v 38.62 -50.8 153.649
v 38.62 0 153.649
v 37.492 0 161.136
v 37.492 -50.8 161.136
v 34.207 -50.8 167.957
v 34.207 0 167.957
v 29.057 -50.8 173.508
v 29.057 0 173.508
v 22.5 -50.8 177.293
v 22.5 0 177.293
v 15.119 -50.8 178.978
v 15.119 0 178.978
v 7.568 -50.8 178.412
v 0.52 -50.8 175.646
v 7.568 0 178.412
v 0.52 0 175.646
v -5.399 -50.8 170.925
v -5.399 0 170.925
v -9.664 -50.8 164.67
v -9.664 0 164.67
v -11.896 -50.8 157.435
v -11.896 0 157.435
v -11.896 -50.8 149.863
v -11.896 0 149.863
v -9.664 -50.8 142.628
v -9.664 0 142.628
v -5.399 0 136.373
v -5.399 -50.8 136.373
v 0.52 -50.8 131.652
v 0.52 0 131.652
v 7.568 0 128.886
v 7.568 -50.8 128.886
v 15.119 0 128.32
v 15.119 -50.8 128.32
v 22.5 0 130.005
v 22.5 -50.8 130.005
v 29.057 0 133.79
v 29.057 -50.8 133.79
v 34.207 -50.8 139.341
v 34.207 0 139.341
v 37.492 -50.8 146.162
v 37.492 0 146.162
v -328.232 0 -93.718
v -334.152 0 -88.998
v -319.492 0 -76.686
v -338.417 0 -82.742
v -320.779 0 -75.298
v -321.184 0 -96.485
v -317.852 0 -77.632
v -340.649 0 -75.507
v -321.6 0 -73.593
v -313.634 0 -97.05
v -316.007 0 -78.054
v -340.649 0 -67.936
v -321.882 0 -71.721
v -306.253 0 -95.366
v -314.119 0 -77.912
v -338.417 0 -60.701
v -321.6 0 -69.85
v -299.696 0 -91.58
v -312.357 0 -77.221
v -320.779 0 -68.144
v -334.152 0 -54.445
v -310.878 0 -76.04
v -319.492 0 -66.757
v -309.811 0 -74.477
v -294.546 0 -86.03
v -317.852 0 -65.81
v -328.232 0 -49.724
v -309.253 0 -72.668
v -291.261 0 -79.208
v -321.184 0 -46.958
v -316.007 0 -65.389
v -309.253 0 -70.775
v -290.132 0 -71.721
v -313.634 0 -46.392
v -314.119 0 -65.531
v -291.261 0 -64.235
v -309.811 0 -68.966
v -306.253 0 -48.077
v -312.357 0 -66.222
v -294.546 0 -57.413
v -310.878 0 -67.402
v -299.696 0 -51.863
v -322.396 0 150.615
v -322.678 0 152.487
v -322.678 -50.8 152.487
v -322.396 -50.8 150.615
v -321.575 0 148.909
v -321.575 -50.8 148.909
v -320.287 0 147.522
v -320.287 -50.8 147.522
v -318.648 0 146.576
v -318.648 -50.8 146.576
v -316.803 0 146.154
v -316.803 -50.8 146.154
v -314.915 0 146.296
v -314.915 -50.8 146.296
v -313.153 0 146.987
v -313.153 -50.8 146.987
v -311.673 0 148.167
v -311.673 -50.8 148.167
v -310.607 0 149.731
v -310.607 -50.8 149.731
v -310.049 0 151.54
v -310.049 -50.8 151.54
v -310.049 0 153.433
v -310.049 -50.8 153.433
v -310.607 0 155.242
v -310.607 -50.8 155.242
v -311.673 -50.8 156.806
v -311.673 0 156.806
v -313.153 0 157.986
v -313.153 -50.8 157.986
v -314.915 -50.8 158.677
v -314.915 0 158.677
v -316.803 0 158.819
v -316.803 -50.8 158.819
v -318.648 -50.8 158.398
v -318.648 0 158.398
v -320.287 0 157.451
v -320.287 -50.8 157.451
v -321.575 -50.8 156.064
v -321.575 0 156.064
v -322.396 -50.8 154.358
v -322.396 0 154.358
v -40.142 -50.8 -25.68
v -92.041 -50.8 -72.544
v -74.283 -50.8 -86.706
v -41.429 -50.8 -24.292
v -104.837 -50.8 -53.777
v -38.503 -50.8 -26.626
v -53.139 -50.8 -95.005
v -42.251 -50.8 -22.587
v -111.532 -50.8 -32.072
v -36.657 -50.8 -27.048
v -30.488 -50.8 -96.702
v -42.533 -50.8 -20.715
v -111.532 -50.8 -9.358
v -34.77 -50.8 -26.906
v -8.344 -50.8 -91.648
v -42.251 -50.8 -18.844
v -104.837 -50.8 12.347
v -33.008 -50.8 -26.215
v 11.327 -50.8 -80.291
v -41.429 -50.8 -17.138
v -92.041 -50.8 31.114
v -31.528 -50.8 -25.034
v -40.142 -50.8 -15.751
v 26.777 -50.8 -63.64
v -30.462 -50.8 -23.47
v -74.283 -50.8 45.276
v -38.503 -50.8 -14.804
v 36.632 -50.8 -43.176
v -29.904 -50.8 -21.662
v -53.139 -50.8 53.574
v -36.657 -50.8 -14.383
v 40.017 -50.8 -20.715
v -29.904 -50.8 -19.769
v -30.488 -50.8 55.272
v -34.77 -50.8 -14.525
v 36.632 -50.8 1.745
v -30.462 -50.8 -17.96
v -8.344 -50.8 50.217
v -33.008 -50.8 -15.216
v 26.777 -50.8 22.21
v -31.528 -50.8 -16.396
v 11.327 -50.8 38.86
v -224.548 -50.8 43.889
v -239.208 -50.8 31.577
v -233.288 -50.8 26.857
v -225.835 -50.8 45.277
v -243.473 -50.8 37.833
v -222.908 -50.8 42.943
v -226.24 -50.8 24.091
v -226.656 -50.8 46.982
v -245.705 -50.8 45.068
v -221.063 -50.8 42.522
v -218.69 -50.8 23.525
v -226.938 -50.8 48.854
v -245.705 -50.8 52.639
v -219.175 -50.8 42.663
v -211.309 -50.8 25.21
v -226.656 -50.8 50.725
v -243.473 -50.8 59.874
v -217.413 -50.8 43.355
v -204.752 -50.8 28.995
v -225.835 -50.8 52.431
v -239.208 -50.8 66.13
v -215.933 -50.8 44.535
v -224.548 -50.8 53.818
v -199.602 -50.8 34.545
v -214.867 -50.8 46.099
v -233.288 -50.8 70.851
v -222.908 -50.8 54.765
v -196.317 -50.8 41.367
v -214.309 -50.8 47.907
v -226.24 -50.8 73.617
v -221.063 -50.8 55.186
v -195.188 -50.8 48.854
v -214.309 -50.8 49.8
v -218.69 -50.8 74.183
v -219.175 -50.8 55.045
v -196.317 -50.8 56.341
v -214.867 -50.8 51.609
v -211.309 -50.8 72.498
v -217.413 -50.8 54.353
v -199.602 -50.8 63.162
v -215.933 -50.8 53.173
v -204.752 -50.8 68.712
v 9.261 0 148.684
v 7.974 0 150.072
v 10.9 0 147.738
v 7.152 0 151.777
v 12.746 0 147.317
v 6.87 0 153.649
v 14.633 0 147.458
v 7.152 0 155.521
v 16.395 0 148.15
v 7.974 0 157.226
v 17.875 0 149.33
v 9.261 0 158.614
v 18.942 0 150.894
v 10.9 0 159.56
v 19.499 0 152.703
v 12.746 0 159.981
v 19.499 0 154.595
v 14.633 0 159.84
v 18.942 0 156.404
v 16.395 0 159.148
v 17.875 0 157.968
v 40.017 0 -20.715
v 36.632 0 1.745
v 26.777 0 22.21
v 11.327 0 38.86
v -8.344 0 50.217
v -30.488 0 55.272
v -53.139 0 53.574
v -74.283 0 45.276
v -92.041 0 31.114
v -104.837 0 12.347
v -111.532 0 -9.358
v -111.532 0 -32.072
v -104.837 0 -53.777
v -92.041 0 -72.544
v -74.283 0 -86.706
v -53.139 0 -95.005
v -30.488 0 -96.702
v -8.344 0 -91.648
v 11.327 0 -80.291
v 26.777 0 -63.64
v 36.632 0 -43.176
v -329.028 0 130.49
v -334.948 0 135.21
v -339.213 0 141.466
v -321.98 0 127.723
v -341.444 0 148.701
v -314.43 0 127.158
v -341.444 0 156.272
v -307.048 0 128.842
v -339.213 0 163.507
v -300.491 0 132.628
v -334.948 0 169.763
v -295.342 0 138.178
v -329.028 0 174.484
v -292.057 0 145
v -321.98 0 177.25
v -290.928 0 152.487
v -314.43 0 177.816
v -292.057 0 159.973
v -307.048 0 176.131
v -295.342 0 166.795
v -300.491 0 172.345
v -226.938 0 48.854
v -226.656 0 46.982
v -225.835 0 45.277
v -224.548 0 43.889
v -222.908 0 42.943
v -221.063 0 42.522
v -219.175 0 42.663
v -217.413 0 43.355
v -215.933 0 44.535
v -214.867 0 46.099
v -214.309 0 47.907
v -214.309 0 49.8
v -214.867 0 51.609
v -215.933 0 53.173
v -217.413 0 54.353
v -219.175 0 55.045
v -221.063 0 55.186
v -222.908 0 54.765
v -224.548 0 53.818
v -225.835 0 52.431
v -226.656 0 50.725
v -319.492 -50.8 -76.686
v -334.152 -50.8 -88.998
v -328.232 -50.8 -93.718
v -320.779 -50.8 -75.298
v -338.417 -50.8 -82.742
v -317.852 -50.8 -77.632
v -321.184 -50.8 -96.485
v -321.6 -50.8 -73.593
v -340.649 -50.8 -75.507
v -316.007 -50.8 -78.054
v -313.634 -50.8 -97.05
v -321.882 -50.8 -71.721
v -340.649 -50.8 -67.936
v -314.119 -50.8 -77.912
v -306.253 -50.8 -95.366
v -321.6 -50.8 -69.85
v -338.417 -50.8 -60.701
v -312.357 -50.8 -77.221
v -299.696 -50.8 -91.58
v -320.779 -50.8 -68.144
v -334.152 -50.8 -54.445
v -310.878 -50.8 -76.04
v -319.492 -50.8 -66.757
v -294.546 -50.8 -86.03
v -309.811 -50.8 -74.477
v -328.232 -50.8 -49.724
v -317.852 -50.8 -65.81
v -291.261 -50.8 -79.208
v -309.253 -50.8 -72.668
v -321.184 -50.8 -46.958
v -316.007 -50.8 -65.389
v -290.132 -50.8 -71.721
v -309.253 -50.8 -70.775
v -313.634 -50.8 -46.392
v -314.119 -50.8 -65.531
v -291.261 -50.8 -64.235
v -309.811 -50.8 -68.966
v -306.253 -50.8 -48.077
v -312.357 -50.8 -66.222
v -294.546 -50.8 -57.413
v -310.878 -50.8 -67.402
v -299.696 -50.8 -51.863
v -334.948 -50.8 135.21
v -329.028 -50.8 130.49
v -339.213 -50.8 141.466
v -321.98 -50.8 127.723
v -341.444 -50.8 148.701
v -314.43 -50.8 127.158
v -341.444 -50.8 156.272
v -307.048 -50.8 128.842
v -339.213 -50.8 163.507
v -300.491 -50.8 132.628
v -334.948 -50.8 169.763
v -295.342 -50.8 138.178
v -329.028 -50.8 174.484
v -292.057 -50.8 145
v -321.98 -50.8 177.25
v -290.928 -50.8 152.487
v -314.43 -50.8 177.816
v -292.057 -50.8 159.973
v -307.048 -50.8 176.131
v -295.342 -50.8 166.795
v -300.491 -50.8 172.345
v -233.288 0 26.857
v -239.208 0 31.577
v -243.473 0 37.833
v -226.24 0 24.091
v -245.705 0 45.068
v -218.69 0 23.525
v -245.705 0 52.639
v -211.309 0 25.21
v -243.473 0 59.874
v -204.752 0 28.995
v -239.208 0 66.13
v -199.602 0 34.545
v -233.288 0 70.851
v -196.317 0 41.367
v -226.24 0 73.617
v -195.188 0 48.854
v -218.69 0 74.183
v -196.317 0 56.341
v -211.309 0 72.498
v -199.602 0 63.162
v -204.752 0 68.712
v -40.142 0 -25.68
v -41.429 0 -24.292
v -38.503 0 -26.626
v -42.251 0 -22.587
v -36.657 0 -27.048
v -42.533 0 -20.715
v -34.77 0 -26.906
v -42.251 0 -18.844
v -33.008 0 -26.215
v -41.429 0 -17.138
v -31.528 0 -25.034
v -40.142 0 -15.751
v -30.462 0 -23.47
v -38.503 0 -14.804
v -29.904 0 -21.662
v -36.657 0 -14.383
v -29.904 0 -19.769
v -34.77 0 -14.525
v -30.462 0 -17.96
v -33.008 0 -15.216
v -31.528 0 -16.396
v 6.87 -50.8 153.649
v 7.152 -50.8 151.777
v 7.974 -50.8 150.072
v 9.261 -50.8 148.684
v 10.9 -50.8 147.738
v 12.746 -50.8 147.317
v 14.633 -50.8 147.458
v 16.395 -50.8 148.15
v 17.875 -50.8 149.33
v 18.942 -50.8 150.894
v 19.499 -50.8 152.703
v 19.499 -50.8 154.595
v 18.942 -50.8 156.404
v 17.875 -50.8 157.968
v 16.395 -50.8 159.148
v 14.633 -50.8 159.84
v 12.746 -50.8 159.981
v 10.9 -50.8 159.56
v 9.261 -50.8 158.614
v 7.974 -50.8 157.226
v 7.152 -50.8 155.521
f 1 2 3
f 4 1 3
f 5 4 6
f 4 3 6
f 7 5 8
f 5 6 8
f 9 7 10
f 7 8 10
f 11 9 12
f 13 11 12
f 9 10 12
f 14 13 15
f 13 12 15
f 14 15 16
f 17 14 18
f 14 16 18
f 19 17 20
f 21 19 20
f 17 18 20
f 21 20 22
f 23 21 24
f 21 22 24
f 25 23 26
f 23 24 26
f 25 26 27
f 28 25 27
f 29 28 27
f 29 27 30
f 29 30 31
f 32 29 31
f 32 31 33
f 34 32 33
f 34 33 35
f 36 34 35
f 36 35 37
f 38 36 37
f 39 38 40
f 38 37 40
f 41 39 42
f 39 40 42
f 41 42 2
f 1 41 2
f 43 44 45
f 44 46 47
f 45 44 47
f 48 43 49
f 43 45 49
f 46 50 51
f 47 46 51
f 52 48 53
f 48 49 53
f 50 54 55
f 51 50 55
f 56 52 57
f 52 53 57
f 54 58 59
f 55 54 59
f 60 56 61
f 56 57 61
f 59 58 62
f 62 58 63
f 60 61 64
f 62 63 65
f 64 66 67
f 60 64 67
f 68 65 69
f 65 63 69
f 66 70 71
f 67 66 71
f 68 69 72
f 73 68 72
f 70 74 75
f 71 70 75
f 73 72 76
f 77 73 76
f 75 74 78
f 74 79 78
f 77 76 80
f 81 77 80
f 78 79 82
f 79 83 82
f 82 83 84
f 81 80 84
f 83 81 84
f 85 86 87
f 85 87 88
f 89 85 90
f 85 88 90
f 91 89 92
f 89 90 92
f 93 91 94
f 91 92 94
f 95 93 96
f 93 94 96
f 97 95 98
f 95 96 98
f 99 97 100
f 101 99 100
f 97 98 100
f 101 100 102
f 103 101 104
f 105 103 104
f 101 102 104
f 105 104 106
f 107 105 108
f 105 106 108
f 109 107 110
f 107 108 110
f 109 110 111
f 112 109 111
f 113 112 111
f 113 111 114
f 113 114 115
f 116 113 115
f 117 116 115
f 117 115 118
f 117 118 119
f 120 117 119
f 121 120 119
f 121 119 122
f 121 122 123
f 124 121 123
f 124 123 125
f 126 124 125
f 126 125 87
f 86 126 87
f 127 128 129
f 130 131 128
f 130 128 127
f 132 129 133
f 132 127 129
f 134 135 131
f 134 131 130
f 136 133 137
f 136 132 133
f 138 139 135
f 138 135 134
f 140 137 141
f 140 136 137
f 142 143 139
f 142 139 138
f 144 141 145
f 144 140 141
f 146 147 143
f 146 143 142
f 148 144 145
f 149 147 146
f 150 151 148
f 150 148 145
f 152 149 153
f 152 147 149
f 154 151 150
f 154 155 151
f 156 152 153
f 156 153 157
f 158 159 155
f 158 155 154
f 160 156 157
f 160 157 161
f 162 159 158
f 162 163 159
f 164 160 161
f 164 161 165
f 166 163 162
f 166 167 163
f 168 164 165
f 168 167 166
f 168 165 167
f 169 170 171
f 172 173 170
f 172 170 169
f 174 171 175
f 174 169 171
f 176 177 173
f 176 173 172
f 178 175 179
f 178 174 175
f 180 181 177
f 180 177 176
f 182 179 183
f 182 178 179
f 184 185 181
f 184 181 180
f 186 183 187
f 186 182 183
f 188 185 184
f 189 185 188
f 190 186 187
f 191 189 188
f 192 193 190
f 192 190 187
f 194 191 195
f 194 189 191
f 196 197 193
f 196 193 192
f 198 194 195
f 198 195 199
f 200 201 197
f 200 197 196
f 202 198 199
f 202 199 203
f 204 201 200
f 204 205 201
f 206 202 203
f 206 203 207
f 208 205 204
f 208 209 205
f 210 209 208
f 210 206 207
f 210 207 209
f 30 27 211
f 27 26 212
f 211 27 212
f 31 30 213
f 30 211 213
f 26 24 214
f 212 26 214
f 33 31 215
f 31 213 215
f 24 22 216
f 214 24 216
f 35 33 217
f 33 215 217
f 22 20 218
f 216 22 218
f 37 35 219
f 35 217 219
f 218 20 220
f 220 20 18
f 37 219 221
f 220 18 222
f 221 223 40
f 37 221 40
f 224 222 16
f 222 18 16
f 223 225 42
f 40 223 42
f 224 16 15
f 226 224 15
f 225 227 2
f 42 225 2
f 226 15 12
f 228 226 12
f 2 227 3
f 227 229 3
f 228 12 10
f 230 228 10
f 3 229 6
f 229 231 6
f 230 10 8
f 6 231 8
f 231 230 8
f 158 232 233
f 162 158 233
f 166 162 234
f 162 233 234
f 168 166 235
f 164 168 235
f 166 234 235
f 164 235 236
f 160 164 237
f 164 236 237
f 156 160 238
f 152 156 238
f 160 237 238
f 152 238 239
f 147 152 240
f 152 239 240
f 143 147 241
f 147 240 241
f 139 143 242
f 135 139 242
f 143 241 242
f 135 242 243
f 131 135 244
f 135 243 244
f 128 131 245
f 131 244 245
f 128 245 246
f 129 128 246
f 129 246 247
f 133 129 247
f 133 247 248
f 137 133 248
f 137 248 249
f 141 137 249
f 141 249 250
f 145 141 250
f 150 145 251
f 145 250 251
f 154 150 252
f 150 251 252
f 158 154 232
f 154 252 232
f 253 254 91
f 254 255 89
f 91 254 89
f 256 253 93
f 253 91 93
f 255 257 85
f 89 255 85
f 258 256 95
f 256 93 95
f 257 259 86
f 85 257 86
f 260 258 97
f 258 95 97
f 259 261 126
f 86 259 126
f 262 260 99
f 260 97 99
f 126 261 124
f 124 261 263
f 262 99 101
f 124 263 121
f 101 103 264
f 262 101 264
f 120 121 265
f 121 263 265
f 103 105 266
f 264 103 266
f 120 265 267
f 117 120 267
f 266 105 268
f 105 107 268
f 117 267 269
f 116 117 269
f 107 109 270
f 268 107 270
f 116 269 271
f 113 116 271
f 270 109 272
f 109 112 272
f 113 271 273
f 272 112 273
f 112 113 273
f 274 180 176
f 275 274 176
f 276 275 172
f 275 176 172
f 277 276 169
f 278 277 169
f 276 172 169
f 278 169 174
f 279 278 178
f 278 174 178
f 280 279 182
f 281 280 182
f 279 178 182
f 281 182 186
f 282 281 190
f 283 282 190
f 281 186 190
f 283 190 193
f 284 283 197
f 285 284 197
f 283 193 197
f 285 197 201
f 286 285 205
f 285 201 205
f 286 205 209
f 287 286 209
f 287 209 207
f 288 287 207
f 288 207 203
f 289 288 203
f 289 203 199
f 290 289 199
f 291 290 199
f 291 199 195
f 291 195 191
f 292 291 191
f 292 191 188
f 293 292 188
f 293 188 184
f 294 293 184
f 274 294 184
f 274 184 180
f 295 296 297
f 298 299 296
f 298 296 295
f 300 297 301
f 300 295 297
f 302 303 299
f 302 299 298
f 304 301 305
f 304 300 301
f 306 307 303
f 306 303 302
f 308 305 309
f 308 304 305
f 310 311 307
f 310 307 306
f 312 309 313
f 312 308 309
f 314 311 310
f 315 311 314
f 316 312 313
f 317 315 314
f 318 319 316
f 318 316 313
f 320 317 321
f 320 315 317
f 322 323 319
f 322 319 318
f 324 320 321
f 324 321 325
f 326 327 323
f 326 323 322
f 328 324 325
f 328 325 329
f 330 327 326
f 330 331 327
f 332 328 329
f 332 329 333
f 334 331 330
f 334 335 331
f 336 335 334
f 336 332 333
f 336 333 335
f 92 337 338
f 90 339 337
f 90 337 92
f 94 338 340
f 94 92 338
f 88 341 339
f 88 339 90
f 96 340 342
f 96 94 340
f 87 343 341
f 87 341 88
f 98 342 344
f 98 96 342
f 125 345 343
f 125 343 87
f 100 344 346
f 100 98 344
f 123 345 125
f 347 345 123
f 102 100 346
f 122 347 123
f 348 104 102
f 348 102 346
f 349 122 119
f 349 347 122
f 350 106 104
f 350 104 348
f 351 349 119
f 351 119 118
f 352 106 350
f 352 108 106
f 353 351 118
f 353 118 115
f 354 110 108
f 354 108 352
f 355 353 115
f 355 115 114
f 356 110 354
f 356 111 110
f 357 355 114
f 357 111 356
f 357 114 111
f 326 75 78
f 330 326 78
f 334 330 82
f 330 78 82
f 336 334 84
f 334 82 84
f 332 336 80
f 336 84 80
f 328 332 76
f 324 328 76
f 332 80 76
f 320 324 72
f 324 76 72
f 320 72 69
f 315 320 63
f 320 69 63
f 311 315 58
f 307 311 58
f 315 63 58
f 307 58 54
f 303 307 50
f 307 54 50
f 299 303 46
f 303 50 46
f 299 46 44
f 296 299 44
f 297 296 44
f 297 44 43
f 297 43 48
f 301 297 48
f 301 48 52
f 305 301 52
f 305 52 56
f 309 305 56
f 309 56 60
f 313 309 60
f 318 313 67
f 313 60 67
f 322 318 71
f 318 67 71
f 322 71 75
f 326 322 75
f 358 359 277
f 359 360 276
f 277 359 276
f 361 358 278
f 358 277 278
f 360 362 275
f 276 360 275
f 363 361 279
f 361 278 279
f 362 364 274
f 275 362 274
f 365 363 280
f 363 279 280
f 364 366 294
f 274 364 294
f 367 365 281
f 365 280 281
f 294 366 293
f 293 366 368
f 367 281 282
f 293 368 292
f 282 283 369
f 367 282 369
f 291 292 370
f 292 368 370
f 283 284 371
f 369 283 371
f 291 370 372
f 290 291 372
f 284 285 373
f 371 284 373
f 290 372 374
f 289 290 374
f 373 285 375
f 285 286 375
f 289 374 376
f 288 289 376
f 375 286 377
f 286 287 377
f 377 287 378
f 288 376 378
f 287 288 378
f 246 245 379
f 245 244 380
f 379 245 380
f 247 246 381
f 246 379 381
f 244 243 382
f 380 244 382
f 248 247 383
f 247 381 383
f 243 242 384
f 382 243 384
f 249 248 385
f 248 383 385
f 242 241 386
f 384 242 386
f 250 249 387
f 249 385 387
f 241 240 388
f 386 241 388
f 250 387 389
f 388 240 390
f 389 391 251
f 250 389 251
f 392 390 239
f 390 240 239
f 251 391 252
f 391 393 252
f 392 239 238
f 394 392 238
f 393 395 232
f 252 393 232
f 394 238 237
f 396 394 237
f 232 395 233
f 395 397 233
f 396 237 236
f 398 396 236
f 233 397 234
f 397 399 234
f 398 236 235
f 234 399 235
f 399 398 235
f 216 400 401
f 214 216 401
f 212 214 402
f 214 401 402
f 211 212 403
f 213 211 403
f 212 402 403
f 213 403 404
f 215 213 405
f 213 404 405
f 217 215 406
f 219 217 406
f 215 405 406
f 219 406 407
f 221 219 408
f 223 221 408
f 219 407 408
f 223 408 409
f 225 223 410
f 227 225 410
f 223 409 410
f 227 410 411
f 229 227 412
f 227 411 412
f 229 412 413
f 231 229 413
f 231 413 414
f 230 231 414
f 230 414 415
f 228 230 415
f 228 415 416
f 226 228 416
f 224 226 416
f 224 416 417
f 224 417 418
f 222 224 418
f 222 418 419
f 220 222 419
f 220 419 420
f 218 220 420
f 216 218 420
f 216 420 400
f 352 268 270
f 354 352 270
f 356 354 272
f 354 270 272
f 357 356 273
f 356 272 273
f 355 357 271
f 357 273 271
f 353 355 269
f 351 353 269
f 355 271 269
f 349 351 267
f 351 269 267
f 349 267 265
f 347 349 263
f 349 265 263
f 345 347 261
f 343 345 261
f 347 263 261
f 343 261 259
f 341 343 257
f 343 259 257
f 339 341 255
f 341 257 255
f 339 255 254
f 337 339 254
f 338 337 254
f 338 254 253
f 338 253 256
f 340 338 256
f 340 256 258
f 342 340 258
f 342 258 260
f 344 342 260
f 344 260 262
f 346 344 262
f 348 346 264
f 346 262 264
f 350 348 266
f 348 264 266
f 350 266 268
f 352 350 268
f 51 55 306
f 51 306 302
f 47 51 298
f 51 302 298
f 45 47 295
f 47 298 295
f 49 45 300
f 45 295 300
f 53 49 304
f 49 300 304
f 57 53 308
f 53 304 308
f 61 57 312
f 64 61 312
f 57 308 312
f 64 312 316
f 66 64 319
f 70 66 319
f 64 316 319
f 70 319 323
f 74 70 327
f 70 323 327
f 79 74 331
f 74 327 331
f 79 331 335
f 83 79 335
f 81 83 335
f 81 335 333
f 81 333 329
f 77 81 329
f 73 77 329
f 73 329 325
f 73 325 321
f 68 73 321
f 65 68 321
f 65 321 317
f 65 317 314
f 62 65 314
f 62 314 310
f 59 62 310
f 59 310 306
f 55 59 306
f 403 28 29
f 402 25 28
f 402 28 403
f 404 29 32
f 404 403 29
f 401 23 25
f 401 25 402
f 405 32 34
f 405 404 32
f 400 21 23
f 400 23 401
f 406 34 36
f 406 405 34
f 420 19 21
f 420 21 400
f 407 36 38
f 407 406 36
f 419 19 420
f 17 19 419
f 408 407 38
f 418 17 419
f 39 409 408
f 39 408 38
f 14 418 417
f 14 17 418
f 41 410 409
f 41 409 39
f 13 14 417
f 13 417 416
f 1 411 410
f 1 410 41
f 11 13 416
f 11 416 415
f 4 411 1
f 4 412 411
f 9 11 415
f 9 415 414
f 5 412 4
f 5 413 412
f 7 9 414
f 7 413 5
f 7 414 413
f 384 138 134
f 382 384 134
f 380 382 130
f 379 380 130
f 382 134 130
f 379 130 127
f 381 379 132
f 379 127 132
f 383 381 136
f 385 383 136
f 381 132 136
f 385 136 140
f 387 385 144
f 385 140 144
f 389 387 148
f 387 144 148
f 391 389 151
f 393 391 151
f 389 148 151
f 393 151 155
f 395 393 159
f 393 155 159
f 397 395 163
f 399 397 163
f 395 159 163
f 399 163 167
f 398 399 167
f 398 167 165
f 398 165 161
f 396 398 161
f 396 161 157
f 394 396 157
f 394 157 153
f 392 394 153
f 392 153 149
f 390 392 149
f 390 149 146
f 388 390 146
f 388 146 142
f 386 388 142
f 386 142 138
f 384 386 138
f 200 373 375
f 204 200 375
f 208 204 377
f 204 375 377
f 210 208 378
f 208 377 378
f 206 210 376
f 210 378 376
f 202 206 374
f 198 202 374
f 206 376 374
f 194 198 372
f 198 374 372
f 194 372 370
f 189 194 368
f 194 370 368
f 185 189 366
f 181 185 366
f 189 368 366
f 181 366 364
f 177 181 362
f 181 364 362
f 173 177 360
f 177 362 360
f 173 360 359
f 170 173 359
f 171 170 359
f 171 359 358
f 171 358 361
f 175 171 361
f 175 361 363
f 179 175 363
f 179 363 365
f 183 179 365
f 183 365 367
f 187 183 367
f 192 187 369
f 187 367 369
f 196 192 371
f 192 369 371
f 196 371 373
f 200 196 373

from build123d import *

# Parameters (mm, degrees)
F0_R       = 25.4
F2_DEPTH   = 50.8
F1_R       = 76.2
F5_DEPTH   = 50.8
F6_D       = 12.7
F6_2_D     = 12.7
F6_3_D     = 12.7
F6_ON_F1_D = 12.7
F7_D       = 12.7


# Not quite as in the source:
# - the program builds the solid bodies; features that only make, move or delete a surface that nothing else refers to are left out


with BuildPart() as f2:
    # F0 (on Front) → F2 (new body)
    with BuildSketch(Plane.XZ):
        with Locations((-316.3281083107, 152.4865627289)):
            Circle(F0_R)
    extrude(amount=F2_DEPTH)

    # F6 (through all)
    with Locations(Plane(origin=(0, 0, 0), x_dir=(1, 0, 0), z_dir=(0, 1, 0))):
        with Locations((-315.5324161053, 71.7213749886), (-316.3281083107, -152.4865627289), (13.2203800604, -153.6489874125), (-220.5883562565, -48.8537736237)):
            Hole(F6_D / 2)


with BuildPart() as f2b:
    # F0 (on Front) → F2, piece 2 (new body)
    with BuildSketch(Plane.XZ):
        with Locations((-315.5324161053, -71.7213749886)):
            Circle(F0_R)
    extrude(amount=F2_DEPTH)

    # F6#2 (through all)
    with Locations(Plane(origin=(0, 0, 0), x_dir=(1, 0, 0), z_dir=(0, 1, 0))):
        with Locations((-315.5324161053, 71.7213749886), (-316.3281083107, -152.4865627289), (13.2203800604, -153.6489874125), (-220.5883562565, -48.8537736237)):
            Hole(F6_2_D / 2)


with BuildPart() as f2c:
    # F0 (on Front) → F2, piece 3 (new body)
    with BuildSketch(Plane.XZ):
        with Locations((13.2203800604, 153.6489874125)):
            Circle(F0_R)
    extrude(amount=F2_DEPTH)

    # F6#3 (through all)
    with Locations(Plane(origin=(0, 0, 0), x_dir=(1, 0, 0), z_dir=(0, 1, 0))):
        with Locations((-315.5324161053, 71.7213749886), (-316.3281083107, -152.4865627289), (13.2203800604, -153.6489874125), (-220.5883562565, -48.8537736237)):
            Hole(F6_3_D / 2)


with BuildPart() as f2d:
    # F1 (on Front) → F2, piece 4 (new body)
    with BuildSketch(Plane.XZ):
        with Locations((-36.1828282475, -20.7152944058)):
            Circle(F1_R)
    extrude(amount=F2_DEPTH)

    # F6 on F1 (through all)
    with Locations(Plane(origin=(0, 0, 0), x_dir=(1, 0, 0), z_dir=(0, 1, 0))):
        with Locations((-36.1828282475, 20.7152944058)):
            Hole(F6_ON_F1_D / 2)


with BuildPart() as f5:
    # F0 (on Front) → F5 (new body)
    with BuildSketch(Plane.XZ):
        with Locations((-220.5883562565, 48.8537736237)):
            Circle(F0_R)
    extrude(amount=F5_DEPTH)

    # F7 (through all)
    with Locations(Plane(origin=(0, 0, 0), x_dir=(1, 0, 0), z_dir=(0, 1, 0))):
        with Locations((-220.5883562565, -48.8537736237)):
            Hole(F7_D / 2)


solid = Compound([f2.part, f2b.part, f2c.part, f2d.part, f5.part])
